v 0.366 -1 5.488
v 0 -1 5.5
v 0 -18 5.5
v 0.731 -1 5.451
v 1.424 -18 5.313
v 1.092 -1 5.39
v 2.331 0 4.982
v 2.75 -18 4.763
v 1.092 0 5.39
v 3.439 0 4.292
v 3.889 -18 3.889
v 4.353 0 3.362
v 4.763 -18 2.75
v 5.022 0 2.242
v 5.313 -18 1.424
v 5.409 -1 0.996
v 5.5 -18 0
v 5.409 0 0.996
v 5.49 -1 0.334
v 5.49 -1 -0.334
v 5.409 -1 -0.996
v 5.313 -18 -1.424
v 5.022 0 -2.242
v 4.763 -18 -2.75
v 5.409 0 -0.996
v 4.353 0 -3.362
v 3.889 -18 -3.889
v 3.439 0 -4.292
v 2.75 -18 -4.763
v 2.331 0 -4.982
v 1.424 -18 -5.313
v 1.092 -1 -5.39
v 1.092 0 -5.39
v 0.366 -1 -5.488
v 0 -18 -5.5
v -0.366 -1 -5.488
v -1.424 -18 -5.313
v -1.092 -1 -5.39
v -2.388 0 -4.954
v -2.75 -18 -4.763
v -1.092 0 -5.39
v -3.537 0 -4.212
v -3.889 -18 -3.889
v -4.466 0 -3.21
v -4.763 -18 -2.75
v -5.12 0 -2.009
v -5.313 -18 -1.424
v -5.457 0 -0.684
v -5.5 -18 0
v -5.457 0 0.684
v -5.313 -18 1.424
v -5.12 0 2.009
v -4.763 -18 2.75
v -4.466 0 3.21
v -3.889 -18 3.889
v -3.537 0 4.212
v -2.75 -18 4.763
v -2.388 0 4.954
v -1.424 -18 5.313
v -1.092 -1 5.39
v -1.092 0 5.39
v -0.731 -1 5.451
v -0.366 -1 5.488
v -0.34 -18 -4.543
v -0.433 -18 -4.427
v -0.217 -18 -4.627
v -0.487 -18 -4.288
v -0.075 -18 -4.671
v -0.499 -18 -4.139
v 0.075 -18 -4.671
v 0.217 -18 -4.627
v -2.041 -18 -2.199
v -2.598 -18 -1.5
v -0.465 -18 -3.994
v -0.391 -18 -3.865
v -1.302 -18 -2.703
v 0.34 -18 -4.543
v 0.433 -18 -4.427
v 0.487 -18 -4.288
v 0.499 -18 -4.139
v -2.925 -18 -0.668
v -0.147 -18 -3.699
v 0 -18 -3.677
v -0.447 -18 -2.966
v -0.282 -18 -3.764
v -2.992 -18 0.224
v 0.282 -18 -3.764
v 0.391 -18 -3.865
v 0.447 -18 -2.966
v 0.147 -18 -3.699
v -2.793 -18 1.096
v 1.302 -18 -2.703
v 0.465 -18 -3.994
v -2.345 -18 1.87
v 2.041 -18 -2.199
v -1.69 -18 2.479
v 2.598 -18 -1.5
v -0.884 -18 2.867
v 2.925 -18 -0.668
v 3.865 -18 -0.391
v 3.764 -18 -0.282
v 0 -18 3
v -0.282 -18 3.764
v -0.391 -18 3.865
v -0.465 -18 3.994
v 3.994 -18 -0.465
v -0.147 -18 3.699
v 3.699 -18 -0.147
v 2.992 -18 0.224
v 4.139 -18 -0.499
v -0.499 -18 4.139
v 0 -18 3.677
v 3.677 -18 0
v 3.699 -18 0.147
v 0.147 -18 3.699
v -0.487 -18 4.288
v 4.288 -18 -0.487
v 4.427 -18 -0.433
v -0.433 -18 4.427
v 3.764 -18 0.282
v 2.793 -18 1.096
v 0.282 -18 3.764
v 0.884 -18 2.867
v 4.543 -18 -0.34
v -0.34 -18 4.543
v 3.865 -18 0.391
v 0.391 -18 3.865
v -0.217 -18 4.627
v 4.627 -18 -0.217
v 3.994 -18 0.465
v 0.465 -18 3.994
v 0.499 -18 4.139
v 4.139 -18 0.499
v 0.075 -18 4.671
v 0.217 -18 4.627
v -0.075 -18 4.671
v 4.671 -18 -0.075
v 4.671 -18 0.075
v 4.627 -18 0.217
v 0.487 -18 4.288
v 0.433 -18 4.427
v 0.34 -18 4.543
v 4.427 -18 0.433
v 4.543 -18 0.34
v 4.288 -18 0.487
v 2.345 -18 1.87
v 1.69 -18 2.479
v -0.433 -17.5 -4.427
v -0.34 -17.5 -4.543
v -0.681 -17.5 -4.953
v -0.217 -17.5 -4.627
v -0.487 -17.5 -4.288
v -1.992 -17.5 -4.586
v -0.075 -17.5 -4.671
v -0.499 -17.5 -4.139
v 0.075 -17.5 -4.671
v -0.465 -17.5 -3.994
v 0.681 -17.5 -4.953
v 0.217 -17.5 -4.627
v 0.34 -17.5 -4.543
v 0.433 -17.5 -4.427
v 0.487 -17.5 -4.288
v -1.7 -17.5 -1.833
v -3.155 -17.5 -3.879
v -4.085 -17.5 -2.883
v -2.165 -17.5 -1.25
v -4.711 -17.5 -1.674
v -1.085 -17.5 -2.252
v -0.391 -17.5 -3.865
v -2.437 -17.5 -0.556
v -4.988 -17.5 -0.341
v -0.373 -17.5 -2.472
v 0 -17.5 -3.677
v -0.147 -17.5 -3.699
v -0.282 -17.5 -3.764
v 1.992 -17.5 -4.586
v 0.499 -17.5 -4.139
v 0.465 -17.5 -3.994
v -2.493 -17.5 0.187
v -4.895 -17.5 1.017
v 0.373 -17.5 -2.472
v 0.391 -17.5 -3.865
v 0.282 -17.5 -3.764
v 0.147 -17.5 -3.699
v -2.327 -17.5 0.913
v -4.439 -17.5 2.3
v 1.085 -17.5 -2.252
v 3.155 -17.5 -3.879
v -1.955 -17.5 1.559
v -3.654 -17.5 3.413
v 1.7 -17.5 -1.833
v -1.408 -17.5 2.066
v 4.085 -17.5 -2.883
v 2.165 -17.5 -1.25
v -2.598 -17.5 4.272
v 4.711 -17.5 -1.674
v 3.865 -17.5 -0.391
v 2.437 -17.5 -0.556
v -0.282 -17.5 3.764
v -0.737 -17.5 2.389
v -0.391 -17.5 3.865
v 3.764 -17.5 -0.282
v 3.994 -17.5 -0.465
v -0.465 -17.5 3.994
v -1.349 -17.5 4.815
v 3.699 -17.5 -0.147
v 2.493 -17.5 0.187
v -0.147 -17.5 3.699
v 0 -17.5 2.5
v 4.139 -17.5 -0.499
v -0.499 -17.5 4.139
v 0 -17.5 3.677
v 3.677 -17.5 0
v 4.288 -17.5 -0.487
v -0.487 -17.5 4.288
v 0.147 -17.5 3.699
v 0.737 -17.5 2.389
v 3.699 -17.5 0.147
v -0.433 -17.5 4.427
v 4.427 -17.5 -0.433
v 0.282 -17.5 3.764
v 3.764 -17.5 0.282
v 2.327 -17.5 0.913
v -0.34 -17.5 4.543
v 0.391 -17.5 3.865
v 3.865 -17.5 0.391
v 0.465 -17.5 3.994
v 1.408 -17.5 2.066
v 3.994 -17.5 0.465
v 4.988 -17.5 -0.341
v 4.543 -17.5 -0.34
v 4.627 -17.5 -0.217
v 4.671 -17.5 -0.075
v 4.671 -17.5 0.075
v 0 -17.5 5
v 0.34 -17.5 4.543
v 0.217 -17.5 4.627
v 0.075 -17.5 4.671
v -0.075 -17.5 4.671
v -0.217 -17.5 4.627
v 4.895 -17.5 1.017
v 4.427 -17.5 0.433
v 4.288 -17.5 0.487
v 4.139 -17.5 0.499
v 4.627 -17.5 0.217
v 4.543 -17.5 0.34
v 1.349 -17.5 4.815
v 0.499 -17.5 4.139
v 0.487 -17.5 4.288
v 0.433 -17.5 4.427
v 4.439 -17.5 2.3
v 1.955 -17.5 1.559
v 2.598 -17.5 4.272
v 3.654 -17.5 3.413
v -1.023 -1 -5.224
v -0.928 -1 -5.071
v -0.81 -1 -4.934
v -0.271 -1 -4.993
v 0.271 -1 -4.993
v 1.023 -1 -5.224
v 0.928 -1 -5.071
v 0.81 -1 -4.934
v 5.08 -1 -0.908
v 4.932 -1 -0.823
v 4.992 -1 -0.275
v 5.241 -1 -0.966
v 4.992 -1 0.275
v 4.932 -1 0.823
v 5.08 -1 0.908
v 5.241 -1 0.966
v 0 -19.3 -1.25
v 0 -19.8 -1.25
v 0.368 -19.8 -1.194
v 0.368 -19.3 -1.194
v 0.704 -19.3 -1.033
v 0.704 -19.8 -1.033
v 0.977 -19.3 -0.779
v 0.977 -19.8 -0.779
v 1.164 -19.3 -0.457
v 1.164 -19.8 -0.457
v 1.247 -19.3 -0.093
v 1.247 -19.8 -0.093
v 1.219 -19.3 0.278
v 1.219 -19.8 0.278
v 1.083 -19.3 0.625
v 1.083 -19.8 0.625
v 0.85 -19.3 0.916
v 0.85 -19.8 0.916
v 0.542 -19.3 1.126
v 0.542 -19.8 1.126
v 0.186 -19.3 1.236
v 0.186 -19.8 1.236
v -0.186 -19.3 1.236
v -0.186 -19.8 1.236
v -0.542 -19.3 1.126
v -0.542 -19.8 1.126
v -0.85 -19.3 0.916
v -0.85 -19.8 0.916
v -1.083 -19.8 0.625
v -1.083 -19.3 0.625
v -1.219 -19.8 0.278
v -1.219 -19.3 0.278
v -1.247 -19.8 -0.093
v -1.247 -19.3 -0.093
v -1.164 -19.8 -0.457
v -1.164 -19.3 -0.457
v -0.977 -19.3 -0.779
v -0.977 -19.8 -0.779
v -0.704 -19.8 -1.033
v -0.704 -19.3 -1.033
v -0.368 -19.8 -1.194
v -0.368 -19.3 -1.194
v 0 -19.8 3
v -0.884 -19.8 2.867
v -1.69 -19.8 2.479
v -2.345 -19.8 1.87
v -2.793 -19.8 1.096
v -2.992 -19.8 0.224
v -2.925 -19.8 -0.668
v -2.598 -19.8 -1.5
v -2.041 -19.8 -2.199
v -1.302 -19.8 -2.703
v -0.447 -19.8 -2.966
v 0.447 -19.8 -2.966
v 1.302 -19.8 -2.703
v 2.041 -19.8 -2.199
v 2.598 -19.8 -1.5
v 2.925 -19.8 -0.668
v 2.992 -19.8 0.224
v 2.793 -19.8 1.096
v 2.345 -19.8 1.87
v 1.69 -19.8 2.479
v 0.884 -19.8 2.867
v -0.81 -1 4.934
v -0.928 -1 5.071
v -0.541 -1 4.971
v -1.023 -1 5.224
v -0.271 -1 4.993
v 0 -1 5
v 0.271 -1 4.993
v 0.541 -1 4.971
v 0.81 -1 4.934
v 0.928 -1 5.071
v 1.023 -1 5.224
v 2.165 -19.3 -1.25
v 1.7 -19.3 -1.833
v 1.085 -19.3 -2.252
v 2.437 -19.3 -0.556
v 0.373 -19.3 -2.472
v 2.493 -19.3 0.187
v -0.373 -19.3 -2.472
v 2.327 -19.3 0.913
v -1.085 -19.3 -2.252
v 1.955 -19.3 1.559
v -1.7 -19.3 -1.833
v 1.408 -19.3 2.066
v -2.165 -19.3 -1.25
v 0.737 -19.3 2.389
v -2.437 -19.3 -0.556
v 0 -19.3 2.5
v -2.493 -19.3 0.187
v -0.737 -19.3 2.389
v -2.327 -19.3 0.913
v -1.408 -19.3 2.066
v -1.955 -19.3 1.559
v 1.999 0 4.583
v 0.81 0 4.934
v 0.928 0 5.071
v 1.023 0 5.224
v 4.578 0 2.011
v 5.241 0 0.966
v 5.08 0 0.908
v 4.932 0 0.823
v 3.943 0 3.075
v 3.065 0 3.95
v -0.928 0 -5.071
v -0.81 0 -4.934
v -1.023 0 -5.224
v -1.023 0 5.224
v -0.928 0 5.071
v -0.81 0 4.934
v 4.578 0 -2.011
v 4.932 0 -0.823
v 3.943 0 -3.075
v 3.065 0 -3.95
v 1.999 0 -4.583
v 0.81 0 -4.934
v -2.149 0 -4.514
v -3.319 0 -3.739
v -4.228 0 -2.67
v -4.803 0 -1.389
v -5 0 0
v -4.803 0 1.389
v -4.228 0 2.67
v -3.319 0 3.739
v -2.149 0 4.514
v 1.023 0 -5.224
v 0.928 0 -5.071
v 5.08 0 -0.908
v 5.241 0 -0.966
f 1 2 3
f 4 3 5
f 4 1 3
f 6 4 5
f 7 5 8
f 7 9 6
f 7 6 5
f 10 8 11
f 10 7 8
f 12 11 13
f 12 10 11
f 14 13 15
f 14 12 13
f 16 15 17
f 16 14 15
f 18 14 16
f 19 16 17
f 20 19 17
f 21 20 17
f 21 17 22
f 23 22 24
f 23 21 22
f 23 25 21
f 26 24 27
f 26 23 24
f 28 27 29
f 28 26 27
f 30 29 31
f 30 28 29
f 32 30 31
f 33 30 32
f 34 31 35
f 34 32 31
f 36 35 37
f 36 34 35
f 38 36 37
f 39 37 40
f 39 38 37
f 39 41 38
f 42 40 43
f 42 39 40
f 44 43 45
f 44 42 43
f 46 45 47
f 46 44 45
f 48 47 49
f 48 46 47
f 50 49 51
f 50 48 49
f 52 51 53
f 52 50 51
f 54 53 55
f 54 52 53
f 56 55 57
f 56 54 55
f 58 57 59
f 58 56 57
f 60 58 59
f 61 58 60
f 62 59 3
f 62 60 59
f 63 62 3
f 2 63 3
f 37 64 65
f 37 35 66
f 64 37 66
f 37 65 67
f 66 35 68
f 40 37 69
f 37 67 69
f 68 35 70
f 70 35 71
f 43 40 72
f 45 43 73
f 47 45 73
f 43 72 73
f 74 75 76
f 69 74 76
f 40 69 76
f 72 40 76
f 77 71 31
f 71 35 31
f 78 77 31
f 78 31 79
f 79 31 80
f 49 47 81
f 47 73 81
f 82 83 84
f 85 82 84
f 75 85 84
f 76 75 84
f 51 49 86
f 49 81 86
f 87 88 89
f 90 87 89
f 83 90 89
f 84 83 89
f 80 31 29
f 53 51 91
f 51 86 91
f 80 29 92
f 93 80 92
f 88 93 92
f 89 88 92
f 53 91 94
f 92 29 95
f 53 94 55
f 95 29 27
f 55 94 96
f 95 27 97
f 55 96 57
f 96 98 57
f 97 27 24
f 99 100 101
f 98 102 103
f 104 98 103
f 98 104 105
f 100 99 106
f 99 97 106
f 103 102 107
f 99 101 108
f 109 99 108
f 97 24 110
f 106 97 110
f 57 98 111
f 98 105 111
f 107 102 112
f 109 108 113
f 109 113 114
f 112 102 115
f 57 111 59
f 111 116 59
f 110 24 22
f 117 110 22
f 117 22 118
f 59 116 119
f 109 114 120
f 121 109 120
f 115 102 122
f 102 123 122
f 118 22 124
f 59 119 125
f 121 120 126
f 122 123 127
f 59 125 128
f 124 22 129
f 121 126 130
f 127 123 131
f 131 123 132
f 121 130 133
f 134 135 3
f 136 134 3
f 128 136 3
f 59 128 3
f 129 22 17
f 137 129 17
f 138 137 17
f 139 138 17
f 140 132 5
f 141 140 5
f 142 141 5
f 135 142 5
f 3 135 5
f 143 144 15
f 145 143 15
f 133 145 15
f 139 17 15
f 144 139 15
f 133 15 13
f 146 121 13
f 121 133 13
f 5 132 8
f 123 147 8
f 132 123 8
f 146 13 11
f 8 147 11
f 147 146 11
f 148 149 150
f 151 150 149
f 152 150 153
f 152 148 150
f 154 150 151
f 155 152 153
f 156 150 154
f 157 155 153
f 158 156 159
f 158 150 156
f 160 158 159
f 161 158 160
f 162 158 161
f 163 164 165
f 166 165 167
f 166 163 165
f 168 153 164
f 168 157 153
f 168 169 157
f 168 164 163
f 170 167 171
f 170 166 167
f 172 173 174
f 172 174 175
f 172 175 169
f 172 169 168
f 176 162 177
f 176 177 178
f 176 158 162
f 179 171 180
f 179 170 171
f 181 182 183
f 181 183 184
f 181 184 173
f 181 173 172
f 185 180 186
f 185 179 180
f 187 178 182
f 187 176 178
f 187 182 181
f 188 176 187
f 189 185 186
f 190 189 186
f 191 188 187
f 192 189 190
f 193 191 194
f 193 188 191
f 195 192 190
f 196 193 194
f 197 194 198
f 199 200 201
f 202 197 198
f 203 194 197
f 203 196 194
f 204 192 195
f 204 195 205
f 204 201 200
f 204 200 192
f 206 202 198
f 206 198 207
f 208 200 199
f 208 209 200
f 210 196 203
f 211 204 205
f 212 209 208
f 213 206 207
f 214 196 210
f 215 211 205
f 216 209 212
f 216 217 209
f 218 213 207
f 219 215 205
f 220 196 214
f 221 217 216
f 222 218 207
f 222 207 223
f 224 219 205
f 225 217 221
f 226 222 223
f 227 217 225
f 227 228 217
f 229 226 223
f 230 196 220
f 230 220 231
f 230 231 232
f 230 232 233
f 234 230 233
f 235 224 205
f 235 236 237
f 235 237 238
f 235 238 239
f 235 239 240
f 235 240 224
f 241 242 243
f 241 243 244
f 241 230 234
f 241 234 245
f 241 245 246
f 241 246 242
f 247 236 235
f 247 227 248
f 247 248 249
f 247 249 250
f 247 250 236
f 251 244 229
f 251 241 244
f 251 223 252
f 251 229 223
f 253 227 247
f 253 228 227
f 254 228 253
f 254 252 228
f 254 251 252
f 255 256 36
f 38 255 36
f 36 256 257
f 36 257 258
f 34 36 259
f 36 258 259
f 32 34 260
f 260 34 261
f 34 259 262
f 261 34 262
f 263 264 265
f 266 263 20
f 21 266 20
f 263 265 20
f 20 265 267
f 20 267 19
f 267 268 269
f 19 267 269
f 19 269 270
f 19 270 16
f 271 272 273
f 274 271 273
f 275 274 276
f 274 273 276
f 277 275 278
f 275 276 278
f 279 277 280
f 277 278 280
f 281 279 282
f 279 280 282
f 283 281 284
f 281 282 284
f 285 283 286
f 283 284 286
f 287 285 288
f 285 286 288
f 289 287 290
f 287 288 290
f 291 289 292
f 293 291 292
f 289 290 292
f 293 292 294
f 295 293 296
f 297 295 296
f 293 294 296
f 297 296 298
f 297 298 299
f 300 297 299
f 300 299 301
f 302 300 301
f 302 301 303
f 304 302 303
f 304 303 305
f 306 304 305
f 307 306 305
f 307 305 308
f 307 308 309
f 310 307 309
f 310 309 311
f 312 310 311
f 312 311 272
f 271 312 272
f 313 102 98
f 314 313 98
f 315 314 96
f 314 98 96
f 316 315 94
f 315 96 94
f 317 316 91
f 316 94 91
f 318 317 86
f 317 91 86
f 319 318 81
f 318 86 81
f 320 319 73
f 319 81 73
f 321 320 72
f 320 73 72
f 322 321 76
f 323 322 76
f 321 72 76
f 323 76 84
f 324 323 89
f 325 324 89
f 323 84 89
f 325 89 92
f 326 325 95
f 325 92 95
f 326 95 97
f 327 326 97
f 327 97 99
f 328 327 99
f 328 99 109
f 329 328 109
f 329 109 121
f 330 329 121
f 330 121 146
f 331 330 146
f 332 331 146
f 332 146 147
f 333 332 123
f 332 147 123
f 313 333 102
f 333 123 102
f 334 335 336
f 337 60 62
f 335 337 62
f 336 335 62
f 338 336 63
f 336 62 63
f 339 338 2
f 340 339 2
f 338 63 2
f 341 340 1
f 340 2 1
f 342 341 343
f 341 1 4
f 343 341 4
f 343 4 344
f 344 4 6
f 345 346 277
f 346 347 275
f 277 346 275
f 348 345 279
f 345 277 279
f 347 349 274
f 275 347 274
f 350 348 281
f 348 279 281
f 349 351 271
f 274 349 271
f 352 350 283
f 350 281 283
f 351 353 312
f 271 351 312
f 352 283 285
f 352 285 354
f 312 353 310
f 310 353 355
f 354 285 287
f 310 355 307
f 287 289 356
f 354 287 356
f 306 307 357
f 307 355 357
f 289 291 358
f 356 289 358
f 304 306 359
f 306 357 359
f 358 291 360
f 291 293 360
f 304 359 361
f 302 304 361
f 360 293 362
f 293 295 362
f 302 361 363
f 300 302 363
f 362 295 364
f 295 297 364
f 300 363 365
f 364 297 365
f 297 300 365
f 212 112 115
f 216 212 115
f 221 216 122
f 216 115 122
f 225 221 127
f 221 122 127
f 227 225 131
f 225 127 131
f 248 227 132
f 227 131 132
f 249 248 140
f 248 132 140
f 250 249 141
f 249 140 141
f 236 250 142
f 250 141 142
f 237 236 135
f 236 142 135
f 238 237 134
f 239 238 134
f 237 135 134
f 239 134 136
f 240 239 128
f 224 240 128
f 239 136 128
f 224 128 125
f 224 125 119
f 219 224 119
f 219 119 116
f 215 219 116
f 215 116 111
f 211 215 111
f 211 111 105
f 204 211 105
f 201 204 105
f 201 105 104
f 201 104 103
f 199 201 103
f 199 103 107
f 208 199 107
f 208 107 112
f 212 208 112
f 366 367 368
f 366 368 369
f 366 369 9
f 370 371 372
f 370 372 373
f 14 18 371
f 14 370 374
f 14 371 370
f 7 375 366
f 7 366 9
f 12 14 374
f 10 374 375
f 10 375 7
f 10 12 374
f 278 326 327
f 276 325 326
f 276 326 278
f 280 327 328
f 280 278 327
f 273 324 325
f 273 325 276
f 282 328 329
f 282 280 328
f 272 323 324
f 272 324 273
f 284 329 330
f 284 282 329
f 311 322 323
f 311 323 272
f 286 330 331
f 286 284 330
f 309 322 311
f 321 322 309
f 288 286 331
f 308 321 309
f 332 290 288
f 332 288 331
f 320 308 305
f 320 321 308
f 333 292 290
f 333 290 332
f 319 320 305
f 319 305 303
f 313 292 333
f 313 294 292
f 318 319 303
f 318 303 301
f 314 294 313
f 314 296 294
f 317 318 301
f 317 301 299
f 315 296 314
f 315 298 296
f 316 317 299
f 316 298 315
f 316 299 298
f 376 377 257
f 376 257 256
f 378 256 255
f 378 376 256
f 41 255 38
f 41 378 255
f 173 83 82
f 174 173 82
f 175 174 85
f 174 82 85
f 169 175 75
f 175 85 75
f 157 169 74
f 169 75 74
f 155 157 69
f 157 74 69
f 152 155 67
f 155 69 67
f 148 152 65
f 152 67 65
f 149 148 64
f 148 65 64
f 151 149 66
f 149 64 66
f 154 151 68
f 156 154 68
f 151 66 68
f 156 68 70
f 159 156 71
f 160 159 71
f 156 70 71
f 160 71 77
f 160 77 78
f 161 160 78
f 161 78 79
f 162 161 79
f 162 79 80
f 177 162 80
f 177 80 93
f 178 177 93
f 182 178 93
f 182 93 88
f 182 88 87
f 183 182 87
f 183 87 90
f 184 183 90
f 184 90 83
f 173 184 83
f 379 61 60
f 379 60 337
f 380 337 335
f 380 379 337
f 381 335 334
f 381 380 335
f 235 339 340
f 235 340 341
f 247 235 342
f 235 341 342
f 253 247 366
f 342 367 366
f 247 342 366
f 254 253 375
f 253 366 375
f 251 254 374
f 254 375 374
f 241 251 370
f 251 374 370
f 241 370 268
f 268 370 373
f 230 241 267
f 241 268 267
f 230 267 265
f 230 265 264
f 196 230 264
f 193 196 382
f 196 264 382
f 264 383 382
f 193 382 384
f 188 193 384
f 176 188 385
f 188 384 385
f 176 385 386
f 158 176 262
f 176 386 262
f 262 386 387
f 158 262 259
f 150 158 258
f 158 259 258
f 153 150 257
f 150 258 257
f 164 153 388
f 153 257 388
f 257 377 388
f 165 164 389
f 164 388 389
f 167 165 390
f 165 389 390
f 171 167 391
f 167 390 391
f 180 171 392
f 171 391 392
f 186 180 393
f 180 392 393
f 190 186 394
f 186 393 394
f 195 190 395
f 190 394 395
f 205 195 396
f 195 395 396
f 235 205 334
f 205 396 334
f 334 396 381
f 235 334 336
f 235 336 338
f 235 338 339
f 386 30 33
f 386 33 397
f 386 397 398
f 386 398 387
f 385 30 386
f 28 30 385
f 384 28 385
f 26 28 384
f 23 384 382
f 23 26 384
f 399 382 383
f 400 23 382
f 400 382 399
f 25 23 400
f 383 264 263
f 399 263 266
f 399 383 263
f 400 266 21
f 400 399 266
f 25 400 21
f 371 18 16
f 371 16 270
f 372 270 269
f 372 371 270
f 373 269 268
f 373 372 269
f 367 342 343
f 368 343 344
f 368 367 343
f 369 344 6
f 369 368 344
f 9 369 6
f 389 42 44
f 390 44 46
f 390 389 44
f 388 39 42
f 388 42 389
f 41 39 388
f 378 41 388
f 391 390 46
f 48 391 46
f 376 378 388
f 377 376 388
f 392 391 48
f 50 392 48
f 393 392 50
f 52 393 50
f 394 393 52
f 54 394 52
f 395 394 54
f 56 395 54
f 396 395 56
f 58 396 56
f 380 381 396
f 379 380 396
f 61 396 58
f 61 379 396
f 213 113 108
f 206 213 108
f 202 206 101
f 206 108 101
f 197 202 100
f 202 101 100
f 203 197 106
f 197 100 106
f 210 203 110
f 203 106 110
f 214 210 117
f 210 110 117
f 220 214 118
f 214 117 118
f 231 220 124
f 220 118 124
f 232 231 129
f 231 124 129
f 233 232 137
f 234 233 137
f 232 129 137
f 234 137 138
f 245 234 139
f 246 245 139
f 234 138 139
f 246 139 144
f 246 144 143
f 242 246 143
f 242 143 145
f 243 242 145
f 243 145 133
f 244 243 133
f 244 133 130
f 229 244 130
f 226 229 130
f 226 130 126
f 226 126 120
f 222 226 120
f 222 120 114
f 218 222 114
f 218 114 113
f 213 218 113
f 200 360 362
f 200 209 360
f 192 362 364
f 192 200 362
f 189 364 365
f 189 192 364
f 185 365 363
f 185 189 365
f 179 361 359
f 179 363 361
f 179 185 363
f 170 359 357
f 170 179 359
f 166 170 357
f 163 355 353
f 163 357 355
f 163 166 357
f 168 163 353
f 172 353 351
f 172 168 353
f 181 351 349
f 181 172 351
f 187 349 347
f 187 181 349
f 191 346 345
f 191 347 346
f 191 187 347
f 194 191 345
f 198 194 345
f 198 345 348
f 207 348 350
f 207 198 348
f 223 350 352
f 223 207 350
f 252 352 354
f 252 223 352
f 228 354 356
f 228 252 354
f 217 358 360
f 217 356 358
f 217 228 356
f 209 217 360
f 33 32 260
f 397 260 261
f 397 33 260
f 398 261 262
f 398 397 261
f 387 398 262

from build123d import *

# Parameters (mm, degrees)
ESQUISSE1_R                  = 5.5
BASE_EXTRUSION_DEPTH         = 18
ESQUISSE2_R                  = 3
BOSS_EXTRU_1_DEPTH           = 1.8
COQUE1_T                     = -0.5
ESQUISSE3_R                  = 1.25
ENL_V_MAT_EXTRU_1_DEPTH      = 22.272987566
ESQUISSE4_R                  = 1
ESQUISSE4_R_2                = 1.15
ENL_V_MAT_EXTRU_2_DEPTH      = 1
ENL_V_MAT_EXTRU_3_REACH      = 21.609
ESQUISSE5_R                  = 0.5
R_P_TITION_CIRCULAIRE1_COUNT = 3
R_P_TITION_CIRCULAIRE1_ANGLE = 180


with BuildPart() as part:
    # Esquisse1 → Base-Extrusion (new body)
    with BuildSketch(Plane(origin=(0, 0, 0), x_dir=(1, 0, 0), z_dir=(0, 1, 0))):
        with Locations(Location((0, 0, 0), (0, 0, 270))):
            Circle(ESQUISSE1_R)
    extrude(amount=-BASE_EXTRUSION_DEPTH)

    # Esquisse2 → Boss.-Extru.1 (add)
    with BuildSketch(Plane.XZ.offset(18)):
        with Locations(Location((0, 0, 0), (0, 0, 90))):
            Circle(ESQUISSE2_R)
    extrude(amount=BOSS_EXTRU_1_DEPTH)

    # Coque1
    coque1_openings = [part.faces().sort_by_distance(p)[0] for p in [
        (0, 0, 0),
    ]]
    offset(amount=COQUE1_T, openings=coque1_openings, kind=Kind.INTERSECTION)

    # Esquisse3 → Enlèv. mat.-Extru.1 (cut, through all)
    with BuildSketch(Plane.XZ.offset(19.8)):
        with Locations(Location((0, 0, 0), (0, 0, 270))):
            Circle(ESQUISSE3_R)
    extrude(amount=-ENL_V_MAT_EXTRU_1_DEPTH, mode=Mode.SUBTRACT)

    # Esquisse4 → Enlèv. mat.-Extru.2 (cut)
    with BuildSketch(Plane.XZ):
        with Locations((5.5, 0)):
            Circle(ESQUISSE4_R)
        with Locations((0, -5.75)):
            Circle(ESQUISSE4_R_2)
        with Locations((0, 5.75)):
            Circle(ESQUISSE4_R_2)
    extrude(amount=ENL_V_MAT_EXTRU_2_DEPTH, mode=Mode.SUBTRACT)

    # Esquisse5 → Enlèv. mat.-Extru.3 (cut, up to next)
    with BuildSketch(Plane.XZ.offset(18), mode=Mode.PRIVATE) as enl_v_mat_extru_3_sk1:
        with Locations(Location((0, 4.17675231, 0), (0, 0, 270))):
            Circle(ESQUISSE5_R)
    enl_v_mat_extru_3_tool1 = extrude(enl_v_mat_extru_3_sk1.sketch, amount=-ENL_V_MAT_EXTRU_3_REACH, mode=Mode.PRIVATE) & part.part
    enl_v_mat_extru_3 = enl_v_mat_extru_3_tool1.solids().sort_by_distance((0, -18, 4.176752))[0]
    add(enl_v_mat_extru_3, mode=Mode.SUBTRACT)

    # Répétition circulaire1: Enlèv. mat.-Extru.3 ×3 about axis
    r_p_tition_circulaire1_axis = Axis((0, 0, 0), (0, 1, 0))
    for i in range(1, R_P_TITION_CIRCULAIRE1_COUNT):
        add(enl_v_mat_extru_3.rotate(r_p_tition_circulaire1_axis, i * R_P_TITION_CIRCULAIRE1_ANGLE / (R_P_TITION_CIRCULAIRE1_COUNT - 1)), mode=Mode.SUBTRACT)


solid = part.part
